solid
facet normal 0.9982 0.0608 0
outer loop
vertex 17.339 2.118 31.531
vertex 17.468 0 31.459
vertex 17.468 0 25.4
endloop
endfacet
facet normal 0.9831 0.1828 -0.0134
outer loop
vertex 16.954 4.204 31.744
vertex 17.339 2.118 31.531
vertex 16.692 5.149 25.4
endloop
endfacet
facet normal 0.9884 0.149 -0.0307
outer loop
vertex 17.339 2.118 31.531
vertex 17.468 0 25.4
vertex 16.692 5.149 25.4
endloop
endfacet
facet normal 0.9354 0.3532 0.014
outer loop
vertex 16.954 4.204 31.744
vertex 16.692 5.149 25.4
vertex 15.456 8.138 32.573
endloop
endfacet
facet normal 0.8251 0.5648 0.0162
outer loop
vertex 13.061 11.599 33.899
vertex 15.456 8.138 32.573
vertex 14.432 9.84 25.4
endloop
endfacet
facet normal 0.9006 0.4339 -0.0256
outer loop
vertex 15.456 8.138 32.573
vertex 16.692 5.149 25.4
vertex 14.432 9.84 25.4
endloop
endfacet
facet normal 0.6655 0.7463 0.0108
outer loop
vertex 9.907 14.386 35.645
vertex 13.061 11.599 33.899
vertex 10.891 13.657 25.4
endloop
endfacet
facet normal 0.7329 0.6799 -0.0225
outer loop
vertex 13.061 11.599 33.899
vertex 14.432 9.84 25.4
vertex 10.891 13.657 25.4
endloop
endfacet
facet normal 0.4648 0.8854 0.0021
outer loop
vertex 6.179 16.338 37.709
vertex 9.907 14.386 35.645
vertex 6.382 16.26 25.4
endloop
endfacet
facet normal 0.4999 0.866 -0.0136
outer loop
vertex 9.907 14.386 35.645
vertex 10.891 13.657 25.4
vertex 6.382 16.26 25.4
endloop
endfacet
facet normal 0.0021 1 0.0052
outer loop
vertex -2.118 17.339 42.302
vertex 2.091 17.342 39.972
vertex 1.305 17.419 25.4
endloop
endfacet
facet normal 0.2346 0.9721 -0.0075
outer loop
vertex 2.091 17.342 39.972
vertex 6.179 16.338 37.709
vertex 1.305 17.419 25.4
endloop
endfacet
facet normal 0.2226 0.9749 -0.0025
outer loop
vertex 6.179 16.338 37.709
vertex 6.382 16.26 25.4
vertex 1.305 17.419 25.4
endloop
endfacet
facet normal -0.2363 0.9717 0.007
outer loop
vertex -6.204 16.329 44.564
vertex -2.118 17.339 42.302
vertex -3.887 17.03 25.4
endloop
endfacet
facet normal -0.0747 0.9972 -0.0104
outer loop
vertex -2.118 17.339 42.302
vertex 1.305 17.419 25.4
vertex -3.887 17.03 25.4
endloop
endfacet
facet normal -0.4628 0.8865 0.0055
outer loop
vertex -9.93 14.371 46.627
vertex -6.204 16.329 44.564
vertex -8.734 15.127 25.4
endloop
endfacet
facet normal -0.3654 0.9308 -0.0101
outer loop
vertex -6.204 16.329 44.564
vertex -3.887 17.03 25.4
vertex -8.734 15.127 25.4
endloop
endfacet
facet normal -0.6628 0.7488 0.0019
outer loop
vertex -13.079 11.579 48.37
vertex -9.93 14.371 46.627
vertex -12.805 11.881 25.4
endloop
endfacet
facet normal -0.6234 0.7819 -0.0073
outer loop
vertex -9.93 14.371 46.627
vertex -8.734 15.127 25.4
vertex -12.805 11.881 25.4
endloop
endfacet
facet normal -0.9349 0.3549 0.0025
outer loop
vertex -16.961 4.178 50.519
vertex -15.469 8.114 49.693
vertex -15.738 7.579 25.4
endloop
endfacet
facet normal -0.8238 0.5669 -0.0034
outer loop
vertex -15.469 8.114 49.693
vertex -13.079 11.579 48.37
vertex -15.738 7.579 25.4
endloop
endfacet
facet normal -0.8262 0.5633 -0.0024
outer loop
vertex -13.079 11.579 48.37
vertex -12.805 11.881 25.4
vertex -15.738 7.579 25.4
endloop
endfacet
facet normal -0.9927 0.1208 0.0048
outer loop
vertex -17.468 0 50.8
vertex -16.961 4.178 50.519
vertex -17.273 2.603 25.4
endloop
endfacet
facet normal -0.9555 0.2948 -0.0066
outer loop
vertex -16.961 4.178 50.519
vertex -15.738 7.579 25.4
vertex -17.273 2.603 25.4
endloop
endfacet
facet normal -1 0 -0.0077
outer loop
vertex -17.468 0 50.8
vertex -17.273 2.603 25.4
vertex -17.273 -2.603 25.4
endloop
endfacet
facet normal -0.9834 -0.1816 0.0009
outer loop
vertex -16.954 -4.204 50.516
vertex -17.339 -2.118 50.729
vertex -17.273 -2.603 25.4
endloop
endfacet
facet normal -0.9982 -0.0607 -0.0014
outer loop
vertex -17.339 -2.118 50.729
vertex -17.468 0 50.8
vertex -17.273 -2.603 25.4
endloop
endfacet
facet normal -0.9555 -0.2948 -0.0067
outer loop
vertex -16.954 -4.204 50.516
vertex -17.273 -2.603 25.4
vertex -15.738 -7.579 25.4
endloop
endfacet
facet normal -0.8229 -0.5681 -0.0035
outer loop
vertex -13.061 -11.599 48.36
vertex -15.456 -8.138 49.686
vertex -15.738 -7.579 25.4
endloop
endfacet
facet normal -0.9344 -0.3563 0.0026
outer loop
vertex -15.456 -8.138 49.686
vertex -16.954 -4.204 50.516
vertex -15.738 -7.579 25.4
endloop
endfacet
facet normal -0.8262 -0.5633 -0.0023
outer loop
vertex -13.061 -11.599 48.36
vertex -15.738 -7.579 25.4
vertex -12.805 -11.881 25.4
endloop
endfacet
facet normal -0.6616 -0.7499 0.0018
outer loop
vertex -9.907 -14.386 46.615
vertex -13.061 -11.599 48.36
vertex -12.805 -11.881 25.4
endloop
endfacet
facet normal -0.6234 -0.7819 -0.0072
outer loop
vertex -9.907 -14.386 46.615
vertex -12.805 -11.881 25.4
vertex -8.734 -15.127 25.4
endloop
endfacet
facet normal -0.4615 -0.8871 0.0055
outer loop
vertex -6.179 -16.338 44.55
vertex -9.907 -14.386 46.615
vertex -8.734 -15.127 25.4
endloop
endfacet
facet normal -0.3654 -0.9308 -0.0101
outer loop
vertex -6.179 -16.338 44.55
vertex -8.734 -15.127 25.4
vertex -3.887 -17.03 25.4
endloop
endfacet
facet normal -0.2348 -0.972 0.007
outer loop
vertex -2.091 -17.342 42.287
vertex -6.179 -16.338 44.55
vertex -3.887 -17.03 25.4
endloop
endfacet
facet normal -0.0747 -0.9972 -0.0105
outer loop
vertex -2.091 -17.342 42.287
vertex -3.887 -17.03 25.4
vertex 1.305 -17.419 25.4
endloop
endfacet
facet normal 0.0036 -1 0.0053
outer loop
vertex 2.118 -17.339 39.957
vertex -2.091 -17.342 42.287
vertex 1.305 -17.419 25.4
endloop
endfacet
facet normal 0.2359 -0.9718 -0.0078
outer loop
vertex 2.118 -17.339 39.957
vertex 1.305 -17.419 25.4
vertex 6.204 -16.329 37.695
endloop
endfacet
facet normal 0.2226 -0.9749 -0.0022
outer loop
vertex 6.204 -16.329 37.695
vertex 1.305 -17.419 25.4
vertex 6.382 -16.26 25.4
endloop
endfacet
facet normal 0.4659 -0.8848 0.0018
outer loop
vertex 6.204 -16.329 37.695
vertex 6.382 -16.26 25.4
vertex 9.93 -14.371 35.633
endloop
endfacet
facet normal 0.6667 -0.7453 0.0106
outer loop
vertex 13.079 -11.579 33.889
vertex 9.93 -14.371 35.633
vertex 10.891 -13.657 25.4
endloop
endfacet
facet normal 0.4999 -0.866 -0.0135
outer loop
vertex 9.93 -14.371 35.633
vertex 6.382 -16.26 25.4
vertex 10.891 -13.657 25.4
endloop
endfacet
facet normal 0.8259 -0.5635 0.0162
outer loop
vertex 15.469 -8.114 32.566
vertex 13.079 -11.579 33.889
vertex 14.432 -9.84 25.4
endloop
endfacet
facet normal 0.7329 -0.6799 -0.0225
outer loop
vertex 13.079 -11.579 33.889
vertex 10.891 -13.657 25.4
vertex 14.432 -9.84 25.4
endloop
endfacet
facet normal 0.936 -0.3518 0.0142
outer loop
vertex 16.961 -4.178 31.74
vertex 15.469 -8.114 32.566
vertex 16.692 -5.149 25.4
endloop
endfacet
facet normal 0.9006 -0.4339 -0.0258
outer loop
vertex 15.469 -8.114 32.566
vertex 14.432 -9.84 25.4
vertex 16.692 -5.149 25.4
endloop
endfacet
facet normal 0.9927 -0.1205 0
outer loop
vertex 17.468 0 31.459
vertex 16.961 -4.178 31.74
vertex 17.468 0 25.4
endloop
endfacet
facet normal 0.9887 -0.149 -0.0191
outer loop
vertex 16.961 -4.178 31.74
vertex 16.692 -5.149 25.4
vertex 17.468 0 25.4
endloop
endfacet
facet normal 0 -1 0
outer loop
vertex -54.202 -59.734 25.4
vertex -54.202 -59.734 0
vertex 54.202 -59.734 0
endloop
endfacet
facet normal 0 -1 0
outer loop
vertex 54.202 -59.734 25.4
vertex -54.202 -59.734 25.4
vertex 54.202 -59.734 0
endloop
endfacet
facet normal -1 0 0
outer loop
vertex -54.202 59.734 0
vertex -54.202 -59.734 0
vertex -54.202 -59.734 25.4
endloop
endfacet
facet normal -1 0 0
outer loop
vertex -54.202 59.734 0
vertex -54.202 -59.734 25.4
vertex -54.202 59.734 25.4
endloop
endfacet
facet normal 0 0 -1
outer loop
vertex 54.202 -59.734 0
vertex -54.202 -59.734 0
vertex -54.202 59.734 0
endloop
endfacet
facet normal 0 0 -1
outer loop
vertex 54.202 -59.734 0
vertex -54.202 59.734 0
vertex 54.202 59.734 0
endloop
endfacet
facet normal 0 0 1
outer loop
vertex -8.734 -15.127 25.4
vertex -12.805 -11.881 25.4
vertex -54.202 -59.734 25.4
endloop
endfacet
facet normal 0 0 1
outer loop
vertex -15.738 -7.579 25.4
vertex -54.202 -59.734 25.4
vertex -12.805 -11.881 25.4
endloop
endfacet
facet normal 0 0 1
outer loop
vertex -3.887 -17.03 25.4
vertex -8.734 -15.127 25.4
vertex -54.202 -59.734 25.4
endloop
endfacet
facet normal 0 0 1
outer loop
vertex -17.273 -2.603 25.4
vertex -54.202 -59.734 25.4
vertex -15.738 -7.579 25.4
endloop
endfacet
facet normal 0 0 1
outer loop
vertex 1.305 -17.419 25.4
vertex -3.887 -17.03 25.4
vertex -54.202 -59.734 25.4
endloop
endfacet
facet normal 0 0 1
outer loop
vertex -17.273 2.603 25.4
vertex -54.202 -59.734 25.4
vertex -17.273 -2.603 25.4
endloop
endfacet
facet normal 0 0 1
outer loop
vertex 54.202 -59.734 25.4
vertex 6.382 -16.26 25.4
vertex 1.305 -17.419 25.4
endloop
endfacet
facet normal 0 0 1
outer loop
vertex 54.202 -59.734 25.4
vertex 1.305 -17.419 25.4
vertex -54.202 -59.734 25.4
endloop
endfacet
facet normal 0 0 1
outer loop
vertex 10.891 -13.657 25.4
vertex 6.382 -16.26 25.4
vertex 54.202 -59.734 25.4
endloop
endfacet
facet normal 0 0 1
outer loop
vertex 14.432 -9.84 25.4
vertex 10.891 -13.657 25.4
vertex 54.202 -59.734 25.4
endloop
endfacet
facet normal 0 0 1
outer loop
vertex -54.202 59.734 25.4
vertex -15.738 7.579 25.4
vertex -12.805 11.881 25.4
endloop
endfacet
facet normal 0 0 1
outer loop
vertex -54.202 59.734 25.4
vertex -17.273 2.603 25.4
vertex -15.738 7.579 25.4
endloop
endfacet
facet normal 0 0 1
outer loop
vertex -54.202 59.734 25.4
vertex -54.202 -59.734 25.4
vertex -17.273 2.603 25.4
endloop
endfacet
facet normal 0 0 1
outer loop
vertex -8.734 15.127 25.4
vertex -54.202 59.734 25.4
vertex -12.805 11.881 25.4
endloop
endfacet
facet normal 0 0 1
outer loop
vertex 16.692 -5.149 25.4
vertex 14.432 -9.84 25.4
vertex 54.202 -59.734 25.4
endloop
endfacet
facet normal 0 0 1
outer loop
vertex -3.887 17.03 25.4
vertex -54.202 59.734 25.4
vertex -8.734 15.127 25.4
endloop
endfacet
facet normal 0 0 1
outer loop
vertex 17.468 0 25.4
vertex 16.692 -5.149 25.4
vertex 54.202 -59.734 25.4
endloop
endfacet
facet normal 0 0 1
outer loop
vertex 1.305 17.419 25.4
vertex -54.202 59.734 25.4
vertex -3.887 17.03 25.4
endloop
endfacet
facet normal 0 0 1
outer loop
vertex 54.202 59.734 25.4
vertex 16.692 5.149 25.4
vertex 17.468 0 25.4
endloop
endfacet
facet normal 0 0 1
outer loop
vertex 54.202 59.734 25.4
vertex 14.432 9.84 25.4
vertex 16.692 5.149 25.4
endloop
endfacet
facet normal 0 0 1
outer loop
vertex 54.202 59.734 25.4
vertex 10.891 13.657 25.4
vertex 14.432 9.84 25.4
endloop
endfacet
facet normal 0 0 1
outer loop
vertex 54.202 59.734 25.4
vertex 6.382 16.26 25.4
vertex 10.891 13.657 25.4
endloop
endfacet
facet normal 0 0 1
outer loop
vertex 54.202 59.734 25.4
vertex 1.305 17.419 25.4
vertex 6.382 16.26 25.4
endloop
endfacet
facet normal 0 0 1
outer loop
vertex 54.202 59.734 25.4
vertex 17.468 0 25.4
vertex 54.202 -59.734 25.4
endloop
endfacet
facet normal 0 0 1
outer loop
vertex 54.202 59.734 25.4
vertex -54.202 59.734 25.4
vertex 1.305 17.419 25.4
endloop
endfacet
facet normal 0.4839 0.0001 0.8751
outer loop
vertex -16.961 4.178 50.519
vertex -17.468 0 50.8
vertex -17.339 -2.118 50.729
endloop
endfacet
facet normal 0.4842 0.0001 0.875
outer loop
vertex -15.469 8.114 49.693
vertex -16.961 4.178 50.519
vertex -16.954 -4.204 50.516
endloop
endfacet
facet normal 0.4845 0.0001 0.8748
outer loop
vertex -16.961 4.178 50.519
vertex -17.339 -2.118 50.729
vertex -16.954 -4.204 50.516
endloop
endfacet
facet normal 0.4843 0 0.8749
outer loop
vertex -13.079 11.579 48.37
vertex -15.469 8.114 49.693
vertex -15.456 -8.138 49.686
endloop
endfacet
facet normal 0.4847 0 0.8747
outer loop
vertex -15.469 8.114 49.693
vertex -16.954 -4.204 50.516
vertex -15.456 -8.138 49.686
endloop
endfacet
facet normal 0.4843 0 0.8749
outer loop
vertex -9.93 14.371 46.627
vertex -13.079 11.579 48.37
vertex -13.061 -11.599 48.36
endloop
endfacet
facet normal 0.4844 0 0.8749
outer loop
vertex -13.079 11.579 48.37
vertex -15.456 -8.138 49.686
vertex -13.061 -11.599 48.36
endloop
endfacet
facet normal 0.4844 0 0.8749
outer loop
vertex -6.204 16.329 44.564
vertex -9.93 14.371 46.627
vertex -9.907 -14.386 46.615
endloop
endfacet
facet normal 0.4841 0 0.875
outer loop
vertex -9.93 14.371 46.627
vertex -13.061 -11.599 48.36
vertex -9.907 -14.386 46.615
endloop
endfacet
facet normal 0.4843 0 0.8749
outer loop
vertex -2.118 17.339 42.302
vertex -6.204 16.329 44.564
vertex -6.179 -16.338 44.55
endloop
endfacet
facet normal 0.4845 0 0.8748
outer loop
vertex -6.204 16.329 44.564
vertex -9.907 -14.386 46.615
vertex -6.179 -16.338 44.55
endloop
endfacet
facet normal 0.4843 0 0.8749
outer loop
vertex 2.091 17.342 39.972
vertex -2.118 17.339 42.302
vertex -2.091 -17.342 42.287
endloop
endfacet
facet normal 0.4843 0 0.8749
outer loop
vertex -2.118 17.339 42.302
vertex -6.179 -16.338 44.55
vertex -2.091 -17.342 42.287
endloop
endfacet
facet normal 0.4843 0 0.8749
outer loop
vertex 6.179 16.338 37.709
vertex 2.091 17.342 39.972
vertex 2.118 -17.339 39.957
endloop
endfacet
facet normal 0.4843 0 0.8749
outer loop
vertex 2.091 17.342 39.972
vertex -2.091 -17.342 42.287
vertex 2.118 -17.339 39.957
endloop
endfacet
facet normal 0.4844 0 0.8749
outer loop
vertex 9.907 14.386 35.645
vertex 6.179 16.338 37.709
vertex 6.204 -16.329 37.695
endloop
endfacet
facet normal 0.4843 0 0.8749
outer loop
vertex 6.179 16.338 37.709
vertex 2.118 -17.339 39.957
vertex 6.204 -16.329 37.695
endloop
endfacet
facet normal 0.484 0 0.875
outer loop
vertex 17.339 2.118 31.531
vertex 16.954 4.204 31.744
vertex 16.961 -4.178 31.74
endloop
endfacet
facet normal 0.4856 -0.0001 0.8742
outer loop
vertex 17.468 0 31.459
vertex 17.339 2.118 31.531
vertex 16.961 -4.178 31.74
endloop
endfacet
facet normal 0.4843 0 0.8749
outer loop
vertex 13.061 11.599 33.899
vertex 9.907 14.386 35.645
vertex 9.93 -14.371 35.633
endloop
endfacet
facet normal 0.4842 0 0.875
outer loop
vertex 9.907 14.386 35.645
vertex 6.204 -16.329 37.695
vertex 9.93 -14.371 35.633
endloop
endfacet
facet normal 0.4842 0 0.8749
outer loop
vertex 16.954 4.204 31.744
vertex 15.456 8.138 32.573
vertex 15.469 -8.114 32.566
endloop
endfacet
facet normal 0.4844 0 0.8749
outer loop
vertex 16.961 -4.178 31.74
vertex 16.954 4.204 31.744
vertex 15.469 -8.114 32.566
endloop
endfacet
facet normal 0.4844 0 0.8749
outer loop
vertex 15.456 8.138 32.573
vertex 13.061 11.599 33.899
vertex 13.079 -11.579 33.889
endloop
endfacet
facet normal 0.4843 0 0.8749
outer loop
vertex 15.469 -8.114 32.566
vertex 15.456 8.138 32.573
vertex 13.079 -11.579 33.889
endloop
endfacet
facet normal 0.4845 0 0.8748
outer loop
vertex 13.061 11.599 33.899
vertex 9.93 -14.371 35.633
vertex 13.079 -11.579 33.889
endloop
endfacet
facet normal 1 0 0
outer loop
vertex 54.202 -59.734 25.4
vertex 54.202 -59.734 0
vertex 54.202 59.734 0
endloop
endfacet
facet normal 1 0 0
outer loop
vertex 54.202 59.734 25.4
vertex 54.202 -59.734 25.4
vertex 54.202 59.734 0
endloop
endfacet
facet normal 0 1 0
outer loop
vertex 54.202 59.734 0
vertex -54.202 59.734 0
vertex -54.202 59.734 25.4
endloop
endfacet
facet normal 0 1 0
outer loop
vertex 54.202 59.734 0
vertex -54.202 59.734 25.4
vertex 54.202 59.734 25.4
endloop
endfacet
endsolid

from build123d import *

# Parameters (mm, degrees)
F0_W     = 108.40325
F0_H     = 119.467252
F1_DEPTH = 25.4
F2_R     = 17.467659
F3_DEPTH = 25.4
F5_DEPTH = 119.468251


with BuildPart() as f1:
    # F0 (on Top) → F1 (new body)
    with BuildSketch(Plane.XY):
        Rectangle(F0_W, F0_H)
    extrude(amount=F1_DEPTH)

    # F2 (on face) → F3 (join)
    with BuildSketch(Plane.XY.offset(25.4)):
        Circle(F2_R)
    extrude(amount=F3_DEPTH)

    # F4 (on face) → F5 (cut, through all)
    with BuildSketch(Plane.XZ.offset(59.733626)):
        Polygon((17.467659, 50.8), (-17.467659, 50.8), (17.467659, 31.459402), align=None)
    extrude(amount=-F5_DEPTH, mode=Mode.SUBTRACT)


solid = f1.part
